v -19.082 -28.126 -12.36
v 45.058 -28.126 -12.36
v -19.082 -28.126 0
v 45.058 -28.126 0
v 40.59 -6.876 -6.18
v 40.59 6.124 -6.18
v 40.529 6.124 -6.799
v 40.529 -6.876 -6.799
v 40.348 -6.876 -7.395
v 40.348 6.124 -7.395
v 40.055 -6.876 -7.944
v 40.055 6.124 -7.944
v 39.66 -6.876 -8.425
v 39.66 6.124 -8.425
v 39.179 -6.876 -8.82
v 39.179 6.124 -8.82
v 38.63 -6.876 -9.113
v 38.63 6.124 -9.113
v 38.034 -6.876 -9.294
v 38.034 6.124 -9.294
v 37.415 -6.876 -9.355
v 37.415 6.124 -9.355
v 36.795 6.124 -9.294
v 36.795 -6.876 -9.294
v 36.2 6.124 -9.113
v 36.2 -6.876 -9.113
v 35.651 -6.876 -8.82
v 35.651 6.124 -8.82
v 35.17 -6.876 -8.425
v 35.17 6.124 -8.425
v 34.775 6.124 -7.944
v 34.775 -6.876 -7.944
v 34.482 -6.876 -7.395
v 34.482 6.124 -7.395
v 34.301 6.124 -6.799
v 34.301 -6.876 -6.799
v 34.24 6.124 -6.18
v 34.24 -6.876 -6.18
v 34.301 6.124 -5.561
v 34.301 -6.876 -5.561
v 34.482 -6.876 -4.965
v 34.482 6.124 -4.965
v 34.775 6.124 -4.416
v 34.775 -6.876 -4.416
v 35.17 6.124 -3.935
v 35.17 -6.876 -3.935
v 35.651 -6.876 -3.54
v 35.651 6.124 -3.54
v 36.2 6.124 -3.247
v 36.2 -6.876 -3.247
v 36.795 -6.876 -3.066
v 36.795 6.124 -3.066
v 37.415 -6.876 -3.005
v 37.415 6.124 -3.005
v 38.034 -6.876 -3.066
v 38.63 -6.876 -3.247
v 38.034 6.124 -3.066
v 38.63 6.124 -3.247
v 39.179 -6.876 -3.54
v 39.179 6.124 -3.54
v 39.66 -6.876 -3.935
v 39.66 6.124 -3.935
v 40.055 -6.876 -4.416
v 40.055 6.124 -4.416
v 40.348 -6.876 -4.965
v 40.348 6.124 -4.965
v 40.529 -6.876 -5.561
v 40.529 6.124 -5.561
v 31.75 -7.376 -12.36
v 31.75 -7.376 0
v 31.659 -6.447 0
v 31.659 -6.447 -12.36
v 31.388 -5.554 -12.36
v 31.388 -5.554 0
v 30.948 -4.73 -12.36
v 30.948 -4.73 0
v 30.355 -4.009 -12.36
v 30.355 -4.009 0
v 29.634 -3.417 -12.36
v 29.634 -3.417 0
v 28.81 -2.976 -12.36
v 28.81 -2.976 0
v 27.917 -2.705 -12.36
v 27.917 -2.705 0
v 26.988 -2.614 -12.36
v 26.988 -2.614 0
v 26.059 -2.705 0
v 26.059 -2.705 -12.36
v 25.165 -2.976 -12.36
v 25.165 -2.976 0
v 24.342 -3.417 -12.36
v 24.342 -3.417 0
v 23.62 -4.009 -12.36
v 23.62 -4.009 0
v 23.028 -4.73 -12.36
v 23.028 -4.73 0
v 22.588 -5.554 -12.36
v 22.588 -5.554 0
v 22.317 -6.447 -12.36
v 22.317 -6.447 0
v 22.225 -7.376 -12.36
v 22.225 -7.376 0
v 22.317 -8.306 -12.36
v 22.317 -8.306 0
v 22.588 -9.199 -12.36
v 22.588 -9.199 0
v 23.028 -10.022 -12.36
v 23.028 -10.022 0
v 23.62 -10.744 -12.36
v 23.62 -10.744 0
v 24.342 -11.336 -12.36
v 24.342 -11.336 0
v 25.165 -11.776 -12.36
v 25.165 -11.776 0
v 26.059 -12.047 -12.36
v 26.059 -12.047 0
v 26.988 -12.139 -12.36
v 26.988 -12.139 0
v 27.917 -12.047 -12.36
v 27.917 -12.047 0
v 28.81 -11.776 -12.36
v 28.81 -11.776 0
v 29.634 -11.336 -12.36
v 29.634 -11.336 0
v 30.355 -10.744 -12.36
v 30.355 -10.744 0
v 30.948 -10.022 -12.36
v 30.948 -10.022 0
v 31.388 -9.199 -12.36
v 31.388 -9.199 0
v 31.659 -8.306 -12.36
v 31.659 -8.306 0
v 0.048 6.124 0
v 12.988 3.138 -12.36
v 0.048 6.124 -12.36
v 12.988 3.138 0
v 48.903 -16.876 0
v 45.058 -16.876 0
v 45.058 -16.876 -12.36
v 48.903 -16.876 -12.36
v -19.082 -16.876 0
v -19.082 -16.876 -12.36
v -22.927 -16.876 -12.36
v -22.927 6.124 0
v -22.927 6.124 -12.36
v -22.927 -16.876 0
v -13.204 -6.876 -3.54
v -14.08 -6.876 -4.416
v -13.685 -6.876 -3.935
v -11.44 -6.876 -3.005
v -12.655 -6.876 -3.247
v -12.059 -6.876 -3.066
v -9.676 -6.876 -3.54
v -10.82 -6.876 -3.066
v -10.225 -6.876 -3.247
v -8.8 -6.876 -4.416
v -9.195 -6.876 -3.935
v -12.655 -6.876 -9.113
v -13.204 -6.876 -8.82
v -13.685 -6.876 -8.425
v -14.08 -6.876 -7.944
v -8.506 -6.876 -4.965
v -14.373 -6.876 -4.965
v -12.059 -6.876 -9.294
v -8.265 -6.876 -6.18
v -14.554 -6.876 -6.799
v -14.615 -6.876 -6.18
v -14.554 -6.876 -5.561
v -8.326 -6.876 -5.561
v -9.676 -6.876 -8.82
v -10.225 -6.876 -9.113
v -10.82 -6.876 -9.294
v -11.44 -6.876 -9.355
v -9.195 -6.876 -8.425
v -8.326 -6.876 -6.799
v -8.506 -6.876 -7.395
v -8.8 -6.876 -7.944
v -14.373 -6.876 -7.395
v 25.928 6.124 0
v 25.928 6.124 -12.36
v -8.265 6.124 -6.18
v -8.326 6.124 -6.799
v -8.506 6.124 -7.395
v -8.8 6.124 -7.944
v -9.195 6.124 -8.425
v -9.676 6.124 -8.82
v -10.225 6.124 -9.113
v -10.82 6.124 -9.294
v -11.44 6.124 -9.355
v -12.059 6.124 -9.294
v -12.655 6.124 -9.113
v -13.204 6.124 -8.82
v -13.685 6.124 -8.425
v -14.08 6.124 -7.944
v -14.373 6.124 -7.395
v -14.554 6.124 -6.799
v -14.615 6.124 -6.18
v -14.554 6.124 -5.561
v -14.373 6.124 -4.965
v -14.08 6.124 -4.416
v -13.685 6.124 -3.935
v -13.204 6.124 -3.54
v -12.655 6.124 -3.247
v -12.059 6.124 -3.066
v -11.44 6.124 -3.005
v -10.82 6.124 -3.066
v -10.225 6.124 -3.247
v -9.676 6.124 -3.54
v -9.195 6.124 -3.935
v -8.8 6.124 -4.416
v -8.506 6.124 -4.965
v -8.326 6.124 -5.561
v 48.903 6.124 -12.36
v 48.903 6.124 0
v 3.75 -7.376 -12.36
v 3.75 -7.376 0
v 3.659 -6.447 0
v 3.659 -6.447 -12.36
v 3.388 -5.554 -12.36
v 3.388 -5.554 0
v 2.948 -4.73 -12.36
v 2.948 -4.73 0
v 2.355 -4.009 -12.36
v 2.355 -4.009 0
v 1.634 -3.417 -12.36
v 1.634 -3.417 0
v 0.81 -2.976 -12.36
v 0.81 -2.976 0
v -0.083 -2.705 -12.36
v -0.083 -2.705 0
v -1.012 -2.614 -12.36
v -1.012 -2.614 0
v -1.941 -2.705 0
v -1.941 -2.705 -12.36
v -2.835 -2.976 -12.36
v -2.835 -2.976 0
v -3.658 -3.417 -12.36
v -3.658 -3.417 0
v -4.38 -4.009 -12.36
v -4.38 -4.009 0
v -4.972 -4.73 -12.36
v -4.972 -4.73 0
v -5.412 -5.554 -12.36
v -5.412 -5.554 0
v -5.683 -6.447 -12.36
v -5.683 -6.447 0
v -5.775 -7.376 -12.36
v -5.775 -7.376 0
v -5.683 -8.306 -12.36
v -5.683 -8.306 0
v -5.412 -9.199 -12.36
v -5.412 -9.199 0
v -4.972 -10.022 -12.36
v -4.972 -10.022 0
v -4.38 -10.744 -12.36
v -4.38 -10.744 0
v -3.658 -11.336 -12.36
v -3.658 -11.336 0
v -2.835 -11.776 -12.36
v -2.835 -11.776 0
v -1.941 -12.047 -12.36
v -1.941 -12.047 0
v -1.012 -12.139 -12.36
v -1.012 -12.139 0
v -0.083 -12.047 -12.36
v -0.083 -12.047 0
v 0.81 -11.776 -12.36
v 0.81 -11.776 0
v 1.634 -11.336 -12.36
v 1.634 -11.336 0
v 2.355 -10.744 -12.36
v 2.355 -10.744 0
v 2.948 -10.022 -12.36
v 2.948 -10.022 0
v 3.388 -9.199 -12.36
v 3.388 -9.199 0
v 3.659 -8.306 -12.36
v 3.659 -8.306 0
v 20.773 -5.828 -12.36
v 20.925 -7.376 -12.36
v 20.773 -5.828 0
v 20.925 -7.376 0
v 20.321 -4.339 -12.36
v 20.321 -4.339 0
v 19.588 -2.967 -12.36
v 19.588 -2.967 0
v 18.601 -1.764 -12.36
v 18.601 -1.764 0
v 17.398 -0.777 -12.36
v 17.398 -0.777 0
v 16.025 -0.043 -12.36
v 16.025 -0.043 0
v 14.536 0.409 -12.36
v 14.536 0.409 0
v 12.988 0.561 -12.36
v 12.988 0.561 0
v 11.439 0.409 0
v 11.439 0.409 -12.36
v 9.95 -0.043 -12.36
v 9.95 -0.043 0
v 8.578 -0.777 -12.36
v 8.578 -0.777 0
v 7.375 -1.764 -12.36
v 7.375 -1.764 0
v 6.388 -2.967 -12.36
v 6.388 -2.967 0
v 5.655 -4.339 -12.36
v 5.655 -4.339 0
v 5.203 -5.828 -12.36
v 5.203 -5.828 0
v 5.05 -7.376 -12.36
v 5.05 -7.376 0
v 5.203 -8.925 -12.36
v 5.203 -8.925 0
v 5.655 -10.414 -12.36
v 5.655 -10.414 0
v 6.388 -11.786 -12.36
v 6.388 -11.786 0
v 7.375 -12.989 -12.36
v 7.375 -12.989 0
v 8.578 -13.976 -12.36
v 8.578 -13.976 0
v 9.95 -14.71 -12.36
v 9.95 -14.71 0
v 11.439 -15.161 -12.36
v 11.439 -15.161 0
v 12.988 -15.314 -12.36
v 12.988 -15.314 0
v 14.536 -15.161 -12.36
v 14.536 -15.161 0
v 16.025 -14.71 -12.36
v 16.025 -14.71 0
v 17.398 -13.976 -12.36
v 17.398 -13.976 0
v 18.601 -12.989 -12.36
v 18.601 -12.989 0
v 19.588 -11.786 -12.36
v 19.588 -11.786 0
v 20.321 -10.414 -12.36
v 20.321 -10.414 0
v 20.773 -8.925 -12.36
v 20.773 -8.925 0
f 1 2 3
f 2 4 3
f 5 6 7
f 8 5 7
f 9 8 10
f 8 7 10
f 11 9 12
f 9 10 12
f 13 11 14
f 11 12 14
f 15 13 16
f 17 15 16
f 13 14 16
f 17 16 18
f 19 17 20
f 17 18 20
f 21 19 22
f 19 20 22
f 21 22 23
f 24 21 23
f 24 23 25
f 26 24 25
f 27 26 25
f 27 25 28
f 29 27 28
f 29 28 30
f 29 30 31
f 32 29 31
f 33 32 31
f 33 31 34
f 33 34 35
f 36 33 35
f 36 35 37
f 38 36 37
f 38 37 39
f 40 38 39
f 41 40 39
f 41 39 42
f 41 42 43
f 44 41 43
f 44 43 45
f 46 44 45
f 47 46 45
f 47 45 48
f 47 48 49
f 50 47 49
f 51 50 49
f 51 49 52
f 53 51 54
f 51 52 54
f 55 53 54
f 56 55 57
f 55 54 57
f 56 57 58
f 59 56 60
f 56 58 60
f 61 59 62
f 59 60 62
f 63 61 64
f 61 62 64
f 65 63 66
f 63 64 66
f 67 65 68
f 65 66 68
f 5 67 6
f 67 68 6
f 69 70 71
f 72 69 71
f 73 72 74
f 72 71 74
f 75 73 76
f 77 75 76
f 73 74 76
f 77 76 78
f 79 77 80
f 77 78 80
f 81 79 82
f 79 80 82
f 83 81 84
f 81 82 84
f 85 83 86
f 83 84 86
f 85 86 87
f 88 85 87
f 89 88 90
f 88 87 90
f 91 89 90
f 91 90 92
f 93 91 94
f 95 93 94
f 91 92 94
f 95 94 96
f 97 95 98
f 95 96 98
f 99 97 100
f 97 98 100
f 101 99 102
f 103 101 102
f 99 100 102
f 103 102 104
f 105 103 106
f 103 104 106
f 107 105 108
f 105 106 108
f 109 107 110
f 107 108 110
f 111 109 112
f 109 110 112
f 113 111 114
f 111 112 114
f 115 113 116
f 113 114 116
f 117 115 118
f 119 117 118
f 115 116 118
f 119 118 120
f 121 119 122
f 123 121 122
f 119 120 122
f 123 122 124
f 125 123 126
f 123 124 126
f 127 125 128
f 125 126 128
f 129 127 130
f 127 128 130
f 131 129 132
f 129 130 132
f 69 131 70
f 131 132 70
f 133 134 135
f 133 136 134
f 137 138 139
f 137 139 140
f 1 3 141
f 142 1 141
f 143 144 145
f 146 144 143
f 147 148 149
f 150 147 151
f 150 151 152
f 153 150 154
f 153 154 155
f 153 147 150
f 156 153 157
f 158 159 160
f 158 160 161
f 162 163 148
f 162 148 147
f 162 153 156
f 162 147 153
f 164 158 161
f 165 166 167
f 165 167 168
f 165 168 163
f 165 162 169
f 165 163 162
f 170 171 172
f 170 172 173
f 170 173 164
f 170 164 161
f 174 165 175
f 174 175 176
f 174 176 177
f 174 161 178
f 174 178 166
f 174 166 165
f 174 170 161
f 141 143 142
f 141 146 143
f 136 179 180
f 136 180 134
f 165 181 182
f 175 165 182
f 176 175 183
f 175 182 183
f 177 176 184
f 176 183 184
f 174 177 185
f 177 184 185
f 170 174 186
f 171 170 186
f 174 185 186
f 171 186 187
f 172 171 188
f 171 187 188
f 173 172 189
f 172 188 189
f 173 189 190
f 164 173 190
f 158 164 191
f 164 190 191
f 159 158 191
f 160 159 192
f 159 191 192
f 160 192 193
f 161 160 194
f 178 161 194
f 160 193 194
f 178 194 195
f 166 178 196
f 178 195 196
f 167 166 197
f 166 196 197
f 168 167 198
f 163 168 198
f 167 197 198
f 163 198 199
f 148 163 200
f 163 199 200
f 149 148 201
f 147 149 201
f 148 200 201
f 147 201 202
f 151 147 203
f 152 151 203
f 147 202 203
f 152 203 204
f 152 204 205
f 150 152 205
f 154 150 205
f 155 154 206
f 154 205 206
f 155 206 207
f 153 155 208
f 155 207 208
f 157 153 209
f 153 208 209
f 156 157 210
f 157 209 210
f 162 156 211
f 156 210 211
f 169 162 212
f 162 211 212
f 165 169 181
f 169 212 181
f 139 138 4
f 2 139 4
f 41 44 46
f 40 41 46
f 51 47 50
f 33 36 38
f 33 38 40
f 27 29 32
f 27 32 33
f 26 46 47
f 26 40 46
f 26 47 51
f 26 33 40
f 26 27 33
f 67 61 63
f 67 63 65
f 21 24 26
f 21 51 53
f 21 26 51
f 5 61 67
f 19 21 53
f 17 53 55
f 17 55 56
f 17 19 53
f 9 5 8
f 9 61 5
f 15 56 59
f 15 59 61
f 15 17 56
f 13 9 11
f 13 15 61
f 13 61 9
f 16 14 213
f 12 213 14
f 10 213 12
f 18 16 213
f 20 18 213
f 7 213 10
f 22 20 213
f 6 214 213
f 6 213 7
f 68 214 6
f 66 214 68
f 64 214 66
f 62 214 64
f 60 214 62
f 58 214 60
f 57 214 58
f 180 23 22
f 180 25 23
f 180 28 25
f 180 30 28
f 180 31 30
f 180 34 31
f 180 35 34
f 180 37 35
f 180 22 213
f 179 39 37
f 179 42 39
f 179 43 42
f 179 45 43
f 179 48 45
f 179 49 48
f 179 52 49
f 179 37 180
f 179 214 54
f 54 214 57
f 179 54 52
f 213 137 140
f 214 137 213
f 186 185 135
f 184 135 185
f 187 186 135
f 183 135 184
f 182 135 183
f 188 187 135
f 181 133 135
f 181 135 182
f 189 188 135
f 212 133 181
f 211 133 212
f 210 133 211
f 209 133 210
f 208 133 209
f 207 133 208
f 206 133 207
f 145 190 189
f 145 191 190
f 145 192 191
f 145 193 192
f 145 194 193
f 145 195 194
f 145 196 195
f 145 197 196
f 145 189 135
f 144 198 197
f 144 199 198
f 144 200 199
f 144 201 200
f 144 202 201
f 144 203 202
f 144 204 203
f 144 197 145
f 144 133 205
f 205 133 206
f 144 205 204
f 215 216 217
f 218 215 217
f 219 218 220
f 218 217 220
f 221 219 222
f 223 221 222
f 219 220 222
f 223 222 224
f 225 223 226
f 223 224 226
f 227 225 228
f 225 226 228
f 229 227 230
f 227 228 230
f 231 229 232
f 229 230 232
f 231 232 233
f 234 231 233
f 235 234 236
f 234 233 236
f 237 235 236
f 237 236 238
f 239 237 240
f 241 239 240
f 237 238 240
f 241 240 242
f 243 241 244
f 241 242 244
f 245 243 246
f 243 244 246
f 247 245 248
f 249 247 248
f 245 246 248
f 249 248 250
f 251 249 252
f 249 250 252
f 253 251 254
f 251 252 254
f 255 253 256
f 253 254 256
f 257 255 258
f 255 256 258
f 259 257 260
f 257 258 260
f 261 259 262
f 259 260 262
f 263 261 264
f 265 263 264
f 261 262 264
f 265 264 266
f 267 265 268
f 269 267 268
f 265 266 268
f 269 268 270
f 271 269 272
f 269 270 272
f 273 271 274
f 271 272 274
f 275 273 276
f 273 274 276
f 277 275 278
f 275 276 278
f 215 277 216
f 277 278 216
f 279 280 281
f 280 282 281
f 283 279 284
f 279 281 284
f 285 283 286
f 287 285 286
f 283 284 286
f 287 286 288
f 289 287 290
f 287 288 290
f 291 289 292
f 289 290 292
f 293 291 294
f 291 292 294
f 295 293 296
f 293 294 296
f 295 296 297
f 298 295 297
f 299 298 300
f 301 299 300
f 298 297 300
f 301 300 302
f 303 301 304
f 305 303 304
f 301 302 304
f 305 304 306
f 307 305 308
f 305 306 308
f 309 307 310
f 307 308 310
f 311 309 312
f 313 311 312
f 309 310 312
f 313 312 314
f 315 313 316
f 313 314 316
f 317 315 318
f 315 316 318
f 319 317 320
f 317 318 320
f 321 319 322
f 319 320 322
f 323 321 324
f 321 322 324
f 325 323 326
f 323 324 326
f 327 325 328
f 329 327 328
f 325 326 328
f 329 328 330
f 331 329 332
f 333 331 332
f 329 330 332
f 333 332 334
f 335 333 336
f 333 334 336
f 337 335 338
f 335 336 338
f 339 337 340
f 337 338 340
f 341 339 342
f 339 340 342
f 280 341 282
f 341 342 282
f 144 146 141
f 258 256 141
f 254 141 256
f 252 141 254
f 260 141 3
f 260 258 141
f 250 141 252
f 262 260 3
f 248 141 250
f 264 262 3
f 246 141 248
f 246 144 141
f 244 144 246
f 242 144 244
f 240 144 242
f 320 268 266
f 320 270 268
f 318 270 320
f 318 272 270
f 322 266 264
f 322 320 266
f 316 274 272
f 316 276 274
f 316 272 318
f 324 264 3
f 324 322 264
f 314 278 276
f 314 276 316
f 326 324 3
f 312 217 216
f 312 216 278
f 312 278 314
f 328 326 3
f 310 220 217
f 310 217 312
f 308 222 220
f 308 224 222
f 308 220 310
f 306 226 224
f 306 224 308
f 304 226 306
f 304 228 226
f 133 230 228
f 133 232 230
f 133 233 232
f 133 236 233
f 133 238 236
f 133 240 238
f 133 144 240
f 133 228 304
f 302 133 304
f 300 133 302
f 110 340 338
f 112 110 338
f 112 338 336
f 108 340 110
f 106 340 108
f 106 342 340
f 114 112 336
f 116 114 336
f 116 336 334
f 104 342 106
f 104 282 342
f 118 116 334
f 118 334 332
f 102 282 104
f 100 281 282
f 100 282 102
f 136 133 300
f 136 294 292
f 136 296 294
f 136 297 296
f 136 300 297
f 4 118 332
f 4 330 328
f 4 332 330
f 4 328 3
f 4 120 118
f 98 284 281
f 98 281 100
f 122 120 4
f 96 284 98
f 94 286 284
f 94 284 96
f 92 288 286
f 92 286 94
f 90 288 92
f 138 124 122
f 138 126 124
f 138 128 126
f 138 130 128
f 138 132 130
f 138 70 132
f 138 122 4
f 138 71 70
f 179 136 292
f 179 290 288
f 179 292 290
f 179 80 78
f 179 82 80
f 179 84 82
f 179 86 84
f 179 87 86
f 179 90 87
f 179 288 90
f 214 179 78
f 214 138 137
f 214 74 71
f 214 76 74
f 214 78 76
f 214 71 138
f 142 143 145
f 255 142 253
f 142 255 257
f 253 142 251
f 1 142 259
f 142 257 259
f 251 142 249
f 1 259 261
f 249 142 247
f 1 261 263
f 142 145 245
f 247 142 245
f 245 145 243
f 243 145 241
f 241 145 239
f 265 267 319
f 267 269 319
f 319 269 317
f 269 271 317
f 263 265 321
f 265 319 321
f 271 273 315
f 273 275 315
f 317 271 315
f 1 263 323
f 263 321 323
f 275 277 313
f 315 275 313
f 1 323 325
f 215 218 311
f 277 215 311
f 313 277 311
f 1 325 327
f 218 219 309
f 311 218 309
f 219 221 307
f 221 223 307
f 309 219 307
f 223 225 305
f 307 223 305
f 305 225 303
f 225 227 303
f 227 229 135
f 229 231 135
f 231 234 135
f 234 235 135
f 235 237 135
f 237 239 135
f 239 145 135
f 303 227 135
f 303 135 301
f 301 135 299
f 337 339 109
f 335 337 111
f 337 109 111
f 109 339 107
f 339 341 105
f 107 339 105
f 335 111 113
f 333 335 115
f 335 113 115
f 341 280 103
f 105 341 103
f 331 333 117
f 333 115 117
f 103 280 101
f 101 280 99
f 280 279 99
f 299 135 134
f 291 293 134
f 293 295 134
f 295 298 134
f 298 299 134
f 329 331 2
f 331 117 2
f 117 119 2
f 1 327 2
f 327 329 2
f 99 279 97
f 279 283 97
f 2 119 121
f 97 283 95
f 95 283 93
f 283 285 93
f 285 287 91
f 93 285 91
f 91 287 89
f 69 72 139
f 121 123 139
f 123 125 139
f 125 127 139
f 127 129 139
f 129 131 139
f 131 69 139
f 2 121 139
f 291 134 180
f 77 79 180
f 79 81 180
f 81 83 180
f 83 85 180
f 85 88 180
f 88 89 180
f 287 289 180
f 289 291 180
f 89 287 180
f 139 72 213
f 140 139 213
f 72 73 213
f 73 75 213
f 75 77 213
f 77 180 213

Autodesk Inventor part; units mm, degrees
ref_plane "YZ Plane" through (0, 0, 0) normal (1, 0, 0) x (0, 1, 0)
ref_plane "XZ Plane" through (0, 0, 0) normal (0, 1, 0) x (-1, 0, 0)
ref_plane "XY Plane" through (0, 0, 0) normal (0, 0, 1) x (1, 0, 0)
sketch "Sketch1" plane through (0, 0, 0) normal (0, 0, 1) x (1, 0, 0)
  point P0 (0, 0)
sketch "Sketch2" plane through (0, 0, 0) normal (0, 0, 1) x (1, 0, 0)
  line L0 (-22.9271, 6.1236) -> (-22.9271, -16.8764)
  line L1 (-22.9271, -16.8764) -> (48.9029, -16.8764)
  line L2 (48.9029, -16.8764) -> (48.9029, 6.1236)
  line L3 (48.9029, 6.1236) -> (-22.9271, 6.1236)
  point P0 (0, 0)
  dimension "d0" = 23
  dimension "d1" = 71.83
extrude "Extrusion1" add sketch "Sketch2" against normal blind 12.36
sketch "Sketch3" plane through (0, 0, 0) normal (0, 0, 1) x (1, 0, 0)
  point P0 (0, 0)
sketch "Sketch4" plane through (0, 0, 0) normal (0, 0, 1) x (1, 0, 0)
  line L0 (0.0479, 6.1236) -> (25.9279, 6.1236)
  line L1 (25.9279, 6.1236) -> (12.9879, 3.1378)
  line L2 (12.9879, 3.1378) -> (0.0479, 6.1236)
  line L3 (48.9029, 6.1236) -> (-22.9271, 6.1236) projected
  line L4 (48.9029, -16.8764) -> (48.9029, 6.1236) projected
  circle A0 centre (12.9879, -7.3764) radius 7.9375
  circle A1 centre (-1.0121, -7.3764) radius 4.7625
  circle A2 centre (26.9879, -7.3764) radius 4.7625
  line L5 (-22.9271, -16.8764) -> (48.9029, -16.8764) projected
  line L6 (-19.0821, -16.8764) -> (45.0579, -16.8764)
  line L7 (45.0579, -16.8764) -> (45.0579, -28.1264)
  line L8 (45.0579, -28.1264) -> (-19.0821, -28.1264)
  line L9 (-19.0821, -28.1264) -> (-19.0821, -16.8764)
  line L10 (-22.9271, 6.1236) -> (-22.9271, -16.8764) projected
  point P0 (0, 0)
  dimension "d4" = 25.88
  dimension "d7" = 13.28
  dimension "d8" = 0
  dimension "d10" = 2.9858
  dimension "d11" = 35.915
  dimension "d12" = 15.875
  dimension "d13" = 9.5
  dimension "d14" = 14
  dimension "d15" = 9.5
  dimension "d16" = 9.5
  dimension "d17" = 14
  dimension "d18" = 9.525
  dimension "d19" = 9.525
  dimension "d20" = 64.14
  dimension "d21" = 11.25
  dimension "d22" = 3.845
  dimension "d23" = 0
extrude "Extrusion2" cut sketch "Sketch4" against normal blind 12.36 contours L0 L1 L2 | A0 | A1 | A2
extrude "Extrusion3" add sketch "Sketch4" against normal blind 12.36 contours L5 L7 L8 L9
sketch "Sketch5" plane through (-22.9271, 6.1236, 0) normal (0, 1, 0) x (1, 0, 0)
  circle A0 centre (11.4875, 6.18) radius 3.175
  line L0 (0, 12.36) -> (22.975, 12.36) projected
  line L1 (0, 0) -> (0, 12.36) projected
  circle A1 centre (60.342, 6.18) radius 3.175
  line L2 (71.83, 0) -> (71.83, 12.36) projected
  point P0 (22.9271, 0)
  dimension "d28" = 6.18
  dimension "d29" = 6.35
  dimension "d30" = 11.4875
  dimension "d31" = 6.35
  dimension "d32" = 11.488
extrude "Extrusion4" cut sketch "Sketch5" against normal blind 13
thread "Thread1" size "1/4-20 UNC" class "2B" standard "ANSI Unified Screw Threads" full length
properties part number "rod holder on"
